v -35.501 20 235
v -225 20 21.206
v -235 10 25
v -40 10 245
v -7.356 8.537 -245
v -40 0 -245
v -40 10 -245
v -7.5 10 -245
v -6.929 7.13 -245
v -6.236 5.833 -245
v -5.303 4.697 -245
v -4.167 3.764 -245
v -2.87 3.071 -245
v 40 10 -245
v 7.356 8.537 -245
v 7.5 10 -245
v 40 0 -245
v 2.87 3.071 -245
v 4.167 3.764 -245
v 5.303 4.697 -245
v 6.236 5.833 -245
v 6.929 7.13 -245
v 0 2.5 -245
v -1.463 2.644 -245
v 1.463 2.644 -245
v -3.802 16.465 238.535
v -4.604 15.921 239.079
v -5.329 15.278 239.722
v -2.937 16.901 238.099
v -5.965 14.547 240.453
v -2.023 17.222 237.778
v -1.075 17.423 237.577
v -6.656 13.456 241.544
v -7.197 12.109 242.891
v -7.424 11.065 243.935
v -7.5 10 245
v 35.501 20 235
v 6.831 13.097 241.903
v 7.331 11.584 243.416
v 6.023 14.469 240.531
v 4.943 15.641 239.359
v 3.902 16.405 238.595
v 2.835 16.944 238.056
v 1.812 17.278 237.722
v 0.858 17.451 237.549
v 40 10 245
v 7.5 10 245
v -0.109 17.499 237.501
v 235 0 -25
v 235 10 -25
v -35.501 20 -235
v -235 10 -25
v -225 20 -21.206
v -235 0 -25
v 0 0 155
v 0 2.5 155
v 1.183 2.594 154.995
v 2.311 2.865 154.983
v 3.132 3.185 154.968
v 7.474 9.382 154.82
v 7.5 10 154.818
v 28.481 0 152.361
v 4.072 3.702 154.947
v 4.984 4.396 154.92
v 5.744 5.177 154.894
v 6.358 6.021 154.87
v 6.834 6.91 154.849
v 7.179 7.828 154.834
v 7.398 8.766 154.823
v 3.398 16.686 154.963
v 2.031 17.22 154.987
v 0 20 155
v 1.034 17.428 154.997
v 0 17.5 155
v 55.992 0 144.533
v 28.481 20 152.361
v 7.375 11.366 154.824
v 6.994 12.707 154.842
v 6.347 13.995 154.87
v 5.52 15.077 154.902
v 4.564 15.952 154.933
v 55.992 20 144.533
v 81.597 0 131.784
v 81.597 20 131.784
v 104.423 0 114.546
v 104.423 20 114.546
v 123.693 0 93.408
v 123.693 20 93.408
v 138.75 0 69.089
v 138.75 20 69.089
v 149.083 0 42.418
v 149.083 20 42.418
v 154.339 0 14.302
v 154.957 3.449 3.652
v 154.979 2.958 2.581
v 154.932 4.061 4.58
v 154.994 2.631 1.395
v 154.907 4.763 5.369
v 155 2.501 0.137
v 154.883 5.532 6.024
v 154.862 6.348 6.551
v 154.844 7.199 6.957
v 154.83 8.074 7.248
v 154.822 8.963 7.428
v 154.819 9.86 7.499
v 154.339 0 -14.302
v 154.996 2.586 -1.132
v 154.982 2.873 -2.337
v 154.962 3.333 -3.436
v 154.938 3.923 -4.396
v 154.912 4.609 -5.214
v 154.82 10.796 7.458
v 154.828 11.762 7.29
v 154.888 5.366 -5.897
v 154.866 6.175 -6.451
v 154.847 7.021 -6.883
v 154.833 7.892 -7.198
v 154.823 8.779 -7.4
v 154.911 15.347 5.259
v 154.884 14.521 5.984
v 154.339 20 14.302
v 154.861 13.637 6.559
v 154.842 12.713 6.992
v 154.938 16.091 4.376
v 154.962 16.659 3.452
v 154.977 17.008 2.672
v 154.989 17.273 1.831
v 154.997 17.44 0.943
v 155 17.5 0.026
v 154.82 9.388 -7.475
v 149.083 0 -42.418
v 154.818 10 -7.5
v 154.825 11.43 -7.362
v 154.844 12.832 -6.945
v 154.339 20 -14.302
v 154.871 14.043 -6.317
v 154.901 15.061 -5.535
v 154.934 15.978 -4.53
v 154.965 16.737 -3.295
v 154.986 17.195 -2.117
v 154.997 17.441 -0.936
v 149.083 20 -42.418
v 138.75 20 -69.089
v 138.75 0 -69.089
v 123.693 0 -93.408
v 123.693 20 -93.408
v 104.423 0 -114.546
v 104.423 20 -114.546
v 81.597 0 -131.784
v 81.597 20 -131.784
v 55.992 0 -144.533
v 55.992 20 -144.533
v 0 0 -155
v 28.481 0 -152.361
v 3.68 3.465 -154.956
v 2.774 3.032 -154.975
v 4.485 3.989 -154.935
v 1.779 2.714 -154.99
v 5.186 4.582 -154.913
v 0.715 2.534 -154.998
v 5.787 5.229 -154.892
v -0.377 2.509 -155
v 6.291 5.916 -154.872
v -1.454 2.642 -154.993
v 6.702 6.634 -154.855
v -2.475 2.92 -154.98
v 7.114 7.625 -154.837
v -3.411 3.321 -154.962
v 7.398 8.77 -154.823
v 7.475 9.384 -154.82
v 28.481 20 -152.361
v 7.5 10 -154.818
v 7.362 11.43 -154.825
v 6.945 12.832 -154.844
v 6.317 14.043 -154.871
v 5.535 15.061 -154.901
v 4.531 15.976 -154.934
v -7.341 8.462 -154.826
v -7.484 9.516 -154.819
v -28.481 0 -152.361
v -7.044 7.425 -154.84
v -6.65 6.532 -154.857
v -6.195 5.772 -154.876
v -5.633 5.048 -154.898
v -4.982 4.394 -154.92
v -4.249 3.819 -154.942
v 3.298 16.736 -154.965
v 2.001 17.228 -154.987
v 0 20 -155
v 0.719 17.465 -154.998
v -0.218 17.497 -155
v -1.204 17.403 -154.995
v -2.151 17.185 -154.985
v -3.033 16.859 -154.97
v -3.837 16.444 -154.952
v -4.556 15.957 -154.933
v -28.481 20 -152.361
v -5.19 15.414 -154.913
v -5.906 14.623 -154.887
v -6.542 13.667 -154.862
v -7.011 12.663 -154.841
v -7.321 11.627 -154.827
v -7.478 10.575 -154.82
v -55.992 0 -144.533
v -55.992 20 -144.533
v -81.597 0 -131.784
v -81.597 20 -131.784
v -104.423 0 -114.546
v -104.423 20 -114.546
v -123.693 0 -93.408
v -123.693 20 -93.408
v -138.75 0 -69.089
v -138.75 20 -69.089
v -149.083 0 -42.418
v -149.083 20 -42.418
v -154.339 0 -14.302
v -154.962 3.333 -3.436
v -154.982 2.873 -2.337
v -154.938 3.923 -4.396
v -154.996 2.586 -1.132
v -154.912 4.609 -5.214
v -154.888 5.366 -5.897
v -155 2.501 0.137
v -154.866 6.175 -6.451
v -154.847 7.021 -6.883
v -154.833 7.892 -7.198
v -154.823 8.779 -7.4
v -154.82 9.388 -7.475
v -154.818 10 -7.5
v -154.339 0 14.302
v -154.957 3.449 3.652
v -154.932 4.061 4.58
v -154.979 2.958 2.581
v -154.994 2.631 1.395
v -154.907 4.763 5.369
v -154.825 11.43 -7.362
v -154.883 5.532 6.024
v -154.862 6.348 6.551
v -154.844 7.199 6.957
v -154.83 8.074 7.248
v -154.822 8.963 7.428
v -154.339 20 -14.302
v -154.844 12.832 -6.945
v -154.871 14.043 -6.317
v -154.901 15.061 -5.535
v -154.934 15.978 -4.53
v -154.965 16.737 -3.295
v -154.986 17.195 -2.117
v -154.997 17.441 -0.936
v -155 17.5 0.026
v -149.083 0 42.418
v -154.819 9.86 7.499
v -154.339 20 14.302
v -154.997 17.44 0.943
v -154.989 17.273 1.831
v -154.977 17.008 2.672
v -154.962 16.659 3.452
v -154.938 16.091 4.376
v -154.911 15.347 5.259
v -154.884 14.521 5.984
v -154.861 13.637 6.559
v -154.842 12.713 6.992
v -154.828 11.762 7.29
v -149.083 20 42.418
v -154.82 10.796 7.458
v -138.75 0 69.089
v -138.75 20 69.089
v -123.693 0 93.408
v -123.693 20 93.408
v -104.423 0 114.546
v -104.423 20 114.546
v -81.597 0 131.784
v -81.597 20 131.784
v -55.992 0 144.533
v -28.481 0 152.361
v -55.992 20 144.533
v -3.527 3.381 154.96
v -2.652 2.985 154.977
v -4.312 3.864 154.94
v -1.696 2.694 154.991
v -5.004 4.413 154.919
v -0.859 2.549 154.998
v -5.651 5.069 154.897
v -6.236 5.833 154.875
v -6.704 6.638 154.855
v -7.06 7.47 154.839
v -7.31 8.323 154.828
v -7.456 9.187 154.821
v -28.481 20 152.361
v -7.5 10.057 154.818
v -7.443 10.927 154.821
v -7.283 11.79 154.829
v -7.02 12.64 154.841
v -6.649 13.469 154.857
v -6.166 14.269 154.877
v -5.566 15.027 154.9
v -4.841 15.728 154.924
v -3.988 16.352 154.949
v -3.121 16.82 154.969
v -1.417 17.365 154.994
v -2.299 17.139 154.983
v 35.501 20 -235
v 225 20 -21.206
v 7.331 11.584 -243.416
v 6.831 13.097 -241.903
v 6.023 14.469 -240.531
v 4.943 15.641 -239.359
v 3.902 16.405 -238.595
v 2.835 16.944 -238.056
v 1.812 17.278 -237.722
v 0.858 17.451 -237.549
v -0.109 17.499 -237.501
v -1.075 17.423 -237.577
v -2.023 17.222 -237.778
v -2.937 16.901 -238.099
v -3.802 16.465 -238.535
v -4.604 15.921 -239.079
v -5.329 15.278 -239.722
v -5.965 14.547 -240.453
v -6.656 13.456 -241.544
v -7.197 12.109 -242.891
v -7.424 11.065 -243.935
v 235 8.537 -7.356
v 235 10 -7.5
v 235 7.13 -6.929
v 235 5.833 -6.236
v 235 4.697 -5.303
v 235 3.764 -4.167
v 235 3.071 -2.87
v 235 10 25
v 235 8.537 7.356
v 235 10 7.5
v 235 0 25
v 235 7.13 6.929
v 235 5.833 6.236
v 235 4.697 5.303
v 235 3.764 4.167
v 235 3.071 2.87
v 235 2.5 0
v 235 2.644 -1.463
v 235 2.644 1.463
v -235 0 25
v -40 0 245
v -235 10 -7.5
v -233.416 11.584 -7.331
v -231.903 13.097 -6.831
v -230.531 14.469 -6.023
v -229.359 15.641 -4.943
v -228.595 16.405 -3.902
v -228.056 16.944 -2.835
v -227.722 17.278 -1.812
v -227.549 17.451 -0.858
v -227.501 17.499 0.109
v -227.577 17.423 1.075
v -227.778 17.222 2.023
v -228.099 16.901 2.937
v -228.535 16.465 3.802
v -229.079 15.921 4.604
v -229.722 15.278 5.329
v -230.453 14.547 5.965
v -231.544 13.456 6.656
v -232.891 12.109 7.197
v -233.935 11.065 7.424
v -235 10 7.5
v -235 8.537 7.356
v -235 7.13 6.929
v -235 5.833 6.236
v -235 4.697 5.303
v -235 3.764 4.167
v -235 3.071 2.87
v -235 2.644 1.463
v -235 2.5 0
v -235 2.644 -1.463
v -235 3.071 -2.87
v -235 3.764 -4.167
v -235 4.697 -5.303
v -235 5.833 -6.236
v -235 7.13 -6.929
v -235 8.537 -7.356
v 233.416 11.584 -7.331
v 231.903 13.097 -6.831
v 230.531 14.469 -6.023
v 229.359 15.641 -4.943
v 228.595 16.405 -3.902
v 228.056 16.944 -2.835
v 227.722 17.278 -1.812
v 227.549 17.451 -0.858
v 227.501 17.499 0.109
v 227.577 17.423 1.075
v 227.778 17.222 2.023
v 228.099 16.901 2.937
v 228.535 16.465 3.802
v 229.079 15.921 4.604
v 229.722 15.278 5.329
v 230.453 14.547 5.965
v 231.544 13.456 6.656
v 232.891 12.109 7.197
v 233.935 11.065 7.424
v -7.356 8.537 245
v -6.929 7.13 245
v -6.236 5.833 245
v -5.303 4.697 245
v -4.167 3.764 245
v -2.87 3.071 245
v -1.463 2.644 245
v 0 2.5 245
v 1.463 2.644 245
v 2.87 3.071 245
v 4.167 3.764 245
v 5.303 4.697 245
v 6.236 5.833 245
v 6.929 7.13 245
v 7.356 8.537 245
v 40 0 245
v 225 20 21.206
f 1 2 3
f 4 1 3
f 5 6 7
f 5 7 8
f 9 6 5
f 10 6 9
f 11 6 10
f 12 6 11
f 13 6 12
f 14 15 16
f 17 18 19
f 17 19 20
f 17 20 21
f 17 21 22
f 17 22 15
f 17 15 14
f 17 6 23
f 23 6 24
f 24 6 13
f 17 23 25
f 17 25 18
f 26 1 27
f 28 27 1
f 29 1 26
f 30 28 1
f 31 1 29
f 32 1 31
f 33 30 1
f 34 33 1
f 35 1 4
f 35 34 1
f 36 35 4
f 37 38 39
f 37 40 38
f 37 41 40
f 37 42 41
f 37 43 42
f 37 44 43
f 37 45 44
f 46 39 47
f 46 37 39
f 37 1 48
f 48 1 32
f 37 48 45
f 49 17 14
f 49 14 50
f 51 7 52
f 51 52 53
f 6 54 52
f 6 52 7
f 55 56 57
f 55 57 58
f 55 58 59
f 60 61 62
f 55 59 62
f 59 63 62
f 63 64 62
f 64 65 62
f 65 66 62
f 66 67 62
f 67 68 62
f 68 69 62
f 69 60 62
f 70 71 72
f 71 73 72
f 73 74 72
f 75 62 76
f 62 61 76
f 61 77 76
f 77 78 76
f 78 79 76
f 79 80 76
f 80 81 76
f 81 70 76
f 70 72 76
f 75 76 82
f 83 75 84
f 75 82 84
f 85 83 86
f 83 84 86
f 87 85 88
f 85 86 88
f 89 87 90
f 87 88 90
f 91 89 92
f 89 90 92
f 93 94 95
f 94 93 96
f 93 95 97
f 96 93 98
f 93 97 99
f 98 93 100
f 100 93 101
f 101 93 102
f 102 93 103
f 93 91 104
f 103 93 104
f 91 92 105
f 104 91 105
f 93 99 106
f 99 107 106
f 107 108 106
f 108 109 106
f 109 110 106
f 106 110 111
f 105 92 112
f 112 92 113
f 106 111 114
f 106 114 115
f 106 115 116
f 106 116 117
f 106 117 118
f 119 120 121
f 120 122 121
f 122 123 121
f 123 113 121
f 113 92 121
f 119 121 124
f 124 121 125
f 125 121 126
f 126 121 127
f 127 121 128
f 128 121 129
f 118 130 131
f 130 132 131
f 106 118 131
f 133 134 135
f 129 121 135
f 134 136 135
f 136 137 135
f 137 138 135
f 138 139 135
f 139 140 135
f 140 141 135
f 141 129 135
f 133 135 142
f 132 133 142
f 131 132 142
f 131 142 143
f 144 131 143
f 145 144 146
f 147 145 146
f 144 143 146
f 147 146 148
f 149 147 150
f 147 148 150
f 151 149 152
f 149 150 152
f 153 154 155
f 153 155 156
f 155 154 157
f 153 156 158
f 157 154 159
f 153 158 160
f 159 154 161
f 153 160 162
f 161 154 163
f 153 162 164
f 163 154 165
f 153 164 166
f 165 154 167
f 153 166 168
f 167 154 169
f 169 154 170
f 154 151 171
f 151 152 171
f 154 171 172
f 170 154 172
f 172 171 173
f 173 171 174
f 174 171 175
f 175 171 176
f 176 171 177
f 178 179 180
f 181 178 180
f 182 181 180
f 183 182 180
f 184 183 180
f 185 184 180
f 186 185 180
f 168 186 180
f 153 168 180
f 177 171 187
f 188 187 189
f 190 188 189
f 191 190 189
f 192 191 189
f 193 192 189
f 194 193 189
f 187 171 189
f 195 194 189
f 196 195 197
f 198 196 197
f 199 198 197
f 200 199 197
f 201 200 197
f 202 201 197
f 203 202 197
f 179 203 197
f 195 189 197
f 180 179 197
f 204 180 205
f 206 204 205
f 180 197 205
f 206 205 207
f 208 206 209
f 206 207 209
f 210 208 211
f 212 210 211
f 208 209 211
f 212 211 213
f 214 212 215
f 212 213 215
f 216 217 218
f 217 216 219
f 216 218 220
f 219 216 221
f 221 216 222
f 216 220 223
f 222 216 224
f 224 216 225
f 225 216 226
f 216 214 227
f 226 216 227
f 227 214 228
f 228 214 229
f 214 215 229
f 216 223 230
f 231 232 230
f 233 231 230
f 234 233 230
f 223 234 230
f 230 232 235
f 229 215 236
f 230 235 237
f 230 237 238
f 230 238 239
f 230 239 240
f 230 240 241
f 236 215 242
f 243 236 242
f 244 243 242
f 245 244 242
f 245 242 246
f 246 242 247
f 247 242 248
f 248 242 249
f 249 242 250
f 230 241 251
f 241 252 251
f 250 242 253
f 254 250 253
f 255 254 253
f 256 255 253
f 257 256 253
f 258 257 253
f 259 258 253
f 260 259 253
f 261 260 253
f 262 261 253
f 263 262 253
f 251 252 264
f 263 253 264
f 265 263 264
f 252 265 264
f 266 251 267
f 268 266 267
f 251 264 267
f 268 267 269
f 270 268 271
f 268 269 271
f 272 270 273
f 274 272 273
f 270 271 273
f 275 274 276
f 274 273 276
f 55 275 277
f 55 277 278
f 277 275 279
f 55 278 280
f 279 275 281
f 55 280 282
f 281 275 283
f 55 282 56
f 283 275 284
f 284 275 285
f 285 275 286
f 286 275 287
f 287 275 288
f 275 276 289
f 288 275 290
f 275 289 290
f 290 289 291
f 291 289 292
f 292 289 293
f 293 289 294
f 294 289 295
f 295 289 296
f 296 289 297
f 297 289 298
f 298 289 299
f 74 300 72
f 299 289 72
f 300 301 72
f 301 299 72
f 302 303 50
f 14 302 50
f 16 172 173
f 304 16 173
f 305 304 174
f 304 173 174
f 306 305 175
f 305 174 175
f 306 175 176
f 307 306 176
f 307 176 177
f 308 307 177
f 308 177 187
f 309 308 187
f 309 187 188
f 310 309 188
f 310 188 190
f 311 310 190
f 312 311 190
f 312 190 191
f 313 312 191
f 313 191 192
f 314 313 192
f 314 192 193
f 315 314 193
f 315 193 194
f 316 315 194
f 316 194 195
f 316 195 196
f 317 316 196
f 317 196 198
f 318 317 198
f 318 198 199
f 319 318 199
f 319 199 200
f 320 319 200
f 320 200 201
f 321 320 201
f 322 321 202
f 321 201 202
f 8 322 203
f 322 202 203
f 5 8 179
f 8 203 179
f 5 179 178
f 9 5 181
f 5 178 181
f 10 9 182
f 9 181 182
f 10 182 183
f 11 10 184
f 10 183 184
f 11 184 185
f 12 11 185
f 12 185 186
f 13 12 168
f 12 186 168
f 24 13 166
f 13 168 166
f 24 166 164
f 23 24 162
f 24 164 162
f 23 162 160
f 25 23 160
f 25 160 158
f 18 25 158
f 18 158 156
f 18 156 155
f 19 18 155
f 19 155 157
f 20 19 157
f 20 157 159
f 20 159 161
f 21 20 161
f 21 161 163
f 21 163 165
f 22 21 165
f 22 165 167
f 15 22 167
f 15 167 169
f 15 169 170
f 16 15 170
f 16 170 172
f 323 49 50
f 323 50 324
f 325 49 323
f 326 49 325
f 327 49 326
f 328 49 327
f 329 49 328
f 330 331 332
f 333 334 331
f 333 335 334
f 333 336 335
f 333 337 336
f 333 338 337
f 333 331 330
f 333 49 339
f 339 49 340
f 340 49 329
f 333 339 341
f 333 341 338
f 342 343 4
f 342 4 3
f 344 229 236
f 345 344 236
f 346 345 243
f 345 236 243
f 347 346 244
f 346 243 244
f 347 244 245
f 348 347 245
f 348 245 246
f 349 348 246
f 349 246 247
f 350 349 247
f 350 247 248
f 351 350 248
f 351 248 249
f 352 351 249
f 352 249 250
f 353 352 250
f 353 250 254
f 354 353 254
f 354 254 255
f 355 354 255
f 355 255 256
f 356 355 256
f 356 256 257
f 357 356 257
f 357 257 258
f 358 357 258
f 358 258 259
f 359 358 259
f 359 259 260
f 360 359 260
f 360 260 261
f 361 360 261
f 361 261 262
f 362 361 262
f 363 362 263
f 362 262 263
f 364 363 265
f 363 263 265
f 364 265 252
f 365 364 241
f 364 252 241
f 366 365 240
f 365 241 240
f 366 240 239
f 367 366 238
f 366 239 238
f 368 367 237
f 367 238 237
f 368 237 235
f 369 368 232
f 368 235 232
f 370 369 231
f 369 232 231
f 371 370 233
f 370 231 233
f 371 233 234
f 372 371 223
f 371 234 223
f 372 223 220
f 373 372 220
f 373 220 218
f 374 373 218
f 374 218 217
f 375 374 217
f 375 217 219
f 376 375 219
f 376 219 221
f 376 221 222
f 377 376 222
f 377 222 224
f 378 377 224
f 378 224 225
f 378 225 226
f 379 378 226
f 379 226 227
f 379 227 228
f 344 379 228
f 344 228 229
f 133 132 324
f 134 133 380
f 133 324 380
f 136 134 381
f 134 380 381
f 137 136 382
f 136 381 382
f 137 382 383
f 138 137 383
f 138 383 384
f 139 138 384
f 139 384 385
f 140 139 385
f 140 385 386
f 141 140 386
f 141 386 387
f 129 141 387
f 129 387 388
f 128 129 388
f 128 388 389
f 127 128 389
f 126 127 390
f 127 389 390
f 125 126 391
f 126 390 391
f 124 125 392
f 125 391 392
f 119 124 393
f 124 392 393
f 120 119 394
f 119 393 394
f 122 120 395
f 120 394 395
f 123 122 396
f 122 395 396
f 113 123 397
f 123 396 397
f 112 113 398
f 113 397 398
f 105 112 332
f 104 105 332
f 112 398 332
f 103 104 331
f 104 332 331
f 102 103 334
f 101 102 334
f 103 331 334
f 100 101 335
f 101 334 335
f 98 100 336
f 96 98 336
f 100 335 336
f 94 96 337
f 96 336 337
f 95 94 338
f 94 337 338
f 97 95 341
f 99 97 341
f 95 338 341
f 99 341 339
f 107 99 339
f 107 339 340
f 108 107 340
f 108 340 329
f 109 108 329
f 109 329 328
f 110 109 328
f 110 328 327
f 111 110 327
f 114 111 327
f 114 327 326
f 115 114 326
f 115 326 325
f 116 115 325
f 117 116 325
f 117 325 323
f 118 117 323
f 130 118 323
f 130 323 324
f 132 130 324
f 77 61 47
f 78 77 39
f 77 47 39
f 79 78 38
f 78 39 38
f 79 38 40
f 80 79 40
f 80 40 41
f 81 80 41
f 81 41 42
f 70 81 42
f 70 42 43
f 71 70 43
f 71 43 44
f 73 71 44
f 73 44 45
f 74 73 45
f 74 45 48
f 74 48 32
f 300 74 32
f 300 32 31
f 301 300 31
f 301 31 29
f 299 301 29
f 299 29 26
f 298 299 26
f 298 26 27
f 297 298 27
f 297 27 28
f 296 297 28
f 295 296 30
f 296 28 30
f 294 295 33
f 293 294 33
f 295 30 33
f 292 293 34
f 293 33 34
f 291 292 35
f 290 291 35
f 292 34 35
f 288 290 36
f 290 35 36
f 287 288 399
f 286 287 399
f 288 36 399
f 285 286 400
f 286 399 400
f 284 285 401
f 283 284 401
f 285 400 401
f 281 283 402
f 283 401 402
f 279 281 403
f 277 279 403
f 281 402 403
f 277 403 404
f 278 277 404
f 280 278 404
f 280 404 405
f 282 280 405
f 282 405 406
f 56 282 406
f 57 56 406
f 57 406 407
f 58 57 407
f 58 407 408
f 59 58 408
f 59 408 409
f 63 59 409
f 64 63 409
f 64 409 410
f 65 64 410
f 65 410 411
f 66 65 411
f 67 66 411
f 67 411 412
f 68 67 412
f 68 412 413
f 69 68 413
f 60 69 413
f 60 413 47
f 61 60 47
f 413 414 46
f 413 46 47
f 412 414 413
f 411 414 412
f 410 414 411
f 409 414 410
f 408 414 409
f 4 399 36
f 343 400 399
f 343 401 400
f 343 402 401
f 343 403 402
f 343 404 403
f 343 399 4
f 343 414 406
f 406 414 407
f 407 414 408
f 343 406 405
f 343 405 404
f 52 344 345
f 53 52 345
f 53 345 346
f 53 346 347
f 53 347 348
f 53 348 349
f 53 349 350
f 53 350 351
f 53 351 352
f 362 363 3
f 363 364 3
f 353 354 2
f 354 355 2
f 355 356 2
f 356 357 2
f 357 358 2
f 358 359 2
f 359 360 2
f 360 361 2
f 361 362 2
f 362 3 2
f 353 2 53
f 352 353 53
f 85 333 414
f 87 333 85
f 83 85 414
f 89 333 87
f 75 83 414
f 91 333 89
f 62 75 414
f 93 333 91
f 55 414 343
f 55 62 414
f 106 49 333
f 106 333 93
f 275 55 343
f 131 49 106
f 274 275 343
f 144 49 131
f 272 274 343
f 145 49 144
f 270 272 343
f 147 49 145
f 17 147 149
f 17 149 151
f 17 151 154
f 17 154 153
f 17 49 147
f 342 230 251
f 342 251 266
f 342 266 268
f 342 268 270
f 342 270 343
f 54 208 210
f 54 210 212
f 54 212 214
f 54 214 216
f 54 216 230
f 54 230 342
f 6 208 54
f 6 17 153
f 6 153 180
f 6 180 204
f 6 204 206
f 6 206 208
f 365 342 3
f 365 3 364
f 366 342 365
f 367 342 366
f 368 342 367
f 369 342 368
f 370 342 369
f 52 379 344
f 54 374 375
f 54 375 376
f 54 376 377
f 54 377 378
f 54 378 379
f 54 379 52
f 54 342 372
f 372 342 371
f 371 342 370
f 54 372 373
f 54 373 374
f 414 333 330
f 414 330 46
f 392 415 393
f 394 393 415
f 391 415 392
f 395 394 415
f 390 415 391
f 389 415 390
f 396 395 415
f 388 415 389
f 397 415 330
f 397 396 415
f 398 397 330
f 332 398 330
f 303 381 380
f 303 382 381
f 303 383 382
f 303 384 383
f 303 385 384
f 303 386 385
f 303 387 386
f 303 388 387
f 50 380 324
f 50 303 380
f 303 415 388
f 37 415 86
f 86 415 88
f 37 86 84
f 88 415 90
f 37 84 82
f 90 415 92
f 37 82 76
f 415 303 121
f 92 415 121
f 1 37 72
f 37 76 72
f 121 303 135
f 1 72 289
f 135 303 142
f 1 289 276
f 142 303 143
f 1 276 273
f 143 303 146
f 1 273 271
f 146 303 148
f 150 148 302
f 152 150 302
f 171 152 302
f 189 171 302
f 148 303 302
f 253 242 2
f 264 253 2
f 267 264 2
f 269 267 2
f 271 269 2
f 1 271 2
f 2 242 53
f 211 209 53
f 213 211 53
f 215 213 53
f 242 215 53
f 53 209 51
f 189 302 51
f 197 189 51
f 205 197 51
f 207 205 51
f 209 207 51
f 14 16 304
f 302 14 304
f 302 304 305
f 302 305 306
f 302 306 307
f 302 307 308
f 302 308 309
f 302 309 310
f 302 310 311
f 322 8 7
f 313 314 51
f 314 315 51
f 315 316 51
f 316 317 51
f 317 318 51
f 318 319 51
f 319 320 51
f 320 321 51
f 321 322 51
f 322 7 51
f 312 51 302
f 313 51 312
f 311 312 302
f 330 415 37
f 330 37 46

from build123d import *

# Parameters (mm, degrees)
BOSS_EXTRUDE1_DEPTH = 20
SKETCH2_R           = 7.5
CUT_EXTRUDE1_DEPTH  = 544.806031596
SKETCH3_R           = 7.5
CUT_EXTRUDE2_DEPTH  = 531.400791855
CHAMFER1_SIZE       = 10
SKETCH4_R           = 155
CUT_EXTRUDE3_DEPTH  = 341.073521463


with BuildPart() as part:
    # Sketch1 → Boss-Extrude1 (new body)
    with BuildSketch(Plane(origin=(0, 0, 0), x_dir=(1, 0, 0), z_dir=(0, 1, 0))):
        Polygon((-235, 25), (-40, 245), (40, 245), (235, 25), (235, -25), (40, -245), (-40, -245), (-235, -25), align=None)
    extrude(amount=BOSS_EXTRUDE1_DEPTH)

    # Sketch2 → Cut-Extrude1 (cut, through all)
    with BuildSketch(Plane.XY.offset(245)):
        with Locations((0, 10)):
            Circle(SKETCH2_R)
    extrude(amount=-CUT_EXTRUDE1_DEPTH, mode=Mode.SUBTRACT)

    # Sketch3 → Cut-Extrude2 (cut, through all)
    with BuildSketch(Plane(origin=(235, 0, 0), x_dir=(0, 0, -1), z_dir=(1, 0, 0))):
        with Locations((0, 10)):
            Circle(SKETCH3_R)
    extrude(amount=-CUT_EXTRUDE2_DEPTH, mode=Mode.SUBTRACT)

    # Chamfer1
    # the kernel refuses this chamfer: 10 mm, written as the material it takes off along each edge
    with BuildSketch(Plane(origin=(-235, 20, 50.71682988), x_dir=(-0.0274958766105877, -0.9996219169112968, 0), z_dir=(0, 0, -1))) as chamfer1_piece_1:
        Polygon((CHAMFER1_SIZE * 0.999621916911, -CHAMFER1_SIZE * 0.0274958766106), (-CHAMFER1_SIZE * 0.0274958766106, -CHAMFER1_SIZE * 0.999621916911), (0, 0), align=None)
    extrude(amount=101.433659759, mode=Mode.SUBTRACT)
    with BuildSketch(Plane(origin=(-22.941833496, 20, 264.245110927), x_dir=(0.7480640019059354, 0.02749587661058627, -0.6630567289620791), z_dir=(-0.6633075143158518, 0, -0.7483469392281404)), Plane(origin=(252.058166504, 20, 5.754889073), x_dir=(-0.7480640019059355, 0.02749587661058636, -0.6630567289620791), z_dir=(-0.6633075143158518, 0, 0.7483469392281404)), Plane(origin=(22.941833496, 20, -264.245110927), x_dir=(-0.7480640019059354, 0.02749587661058627, 0.6630567289620791), z_dir=(0.6633075143158519, 0, 0.7483469392281404))) as chamfer1_piece_2:
        Polygon((CHAMFER1_SIZE * 0.999621916911, CHAMFER1_SIZE * 0.0274958766106), (-CHAMFER1_SIZE * 0.0274958766106, CHAMFER1_SIZE * 0.999621916911), (0, 0), align=None)
    extrude(amount=345.414951681, mode=Mode.SUBTRACT)
    with BuildSketch(Plane(origin=(65.71682988, 20, 245), x_dir=(0, 0.027495876610586282, -0.9996219169112968), z_dir=(-1, 0, 0))) as chamfer1_piece_3:
        Polygon((CHAMFER1_SIZE * 0.999621916911, CHAMFER1_SIZE * 0.0274958766106), (-CHAMFER1_SIZE * 0.0274958766106, CHAMFER1_SIZE * 0.999621916911), (0, 0), align=None)
    extrude(amount=131.433659759, mode=Mode.SUBTRACT)
    with BuildSketch(Plane(origin=(235, 20, -50.71682988), x_dir=(-0.9996219169112968, 0.027495876610586282, 0), z_dir=(0, 0, 1))) as chamfer1_piece_4:
        Polygon((CHAMFER1_SIZE * 0.999621916911, CHAMFER1_SIZE * 0.0274958766106), (-CHAMFER1_SIZE * 0.0274958766106, CHAMFER1_SIZE * 0.999621916911), (0, 0), align=None)
    extrude(amount=101.433659759, mode=Mode.SUBTRACT)
    with BuildSketch(Plane(origin=(-65.71682988, 20, -245), x_dir=(0, -0.9996219169112968, -0.0274958766105877), z_dir=(1, 0, 0))) as chamfer1_piece_5:
        Polygon((CHAMFER1_SIZE * 0.999621916911, -CHAMFER1_SIZE * 0.0274958766106), (-CHAMFER1_SIZE * 0.0274958766106, -CHAMFER1_SIZE * 0.999621916911), (0, 0), align=None)
    extrude(amount=131.433659759, mode=Mode.SUBTRACT)
    with BuildSketch(Plane(origin=(-252.058166504, 20, -5.754889073), x_dir=(-0.020576455102926446, -0.9996219169112968, -0.018238221568502983), z_dir=(0.6633075143158518, 0, -0.7483469392281404))) as chamfer1_piece_6:
        Polygon((CHAMFER1_SIZE * 0.999621916911, -CHAMFER1_SIZE * 0.0274958766106), (-CHAMFER1_SIZE * 0.0274958766106, -CHAMFER1_SIZE * 0.999621916911), (0, 0), align=None)
    extrude(amount=345.414951681, mode=Mode.SUBTRACT)

    # Sketch4 → Cut-Extrude3 (cut, through all)
    with BuildSketch(Plane(origin=(0, 20, 0), x_dir=(1, 0, 0), z_dir=(0, 1, 0))):
        with Locations(Location((0, 0, 0), (0, 0, 270))):
            Circle(SKETCH4_R)
    extrude(amount=-CUT_EXTRUDE3_DEPTH, mode=Mode.SUBTRACT)


solid = part.part
